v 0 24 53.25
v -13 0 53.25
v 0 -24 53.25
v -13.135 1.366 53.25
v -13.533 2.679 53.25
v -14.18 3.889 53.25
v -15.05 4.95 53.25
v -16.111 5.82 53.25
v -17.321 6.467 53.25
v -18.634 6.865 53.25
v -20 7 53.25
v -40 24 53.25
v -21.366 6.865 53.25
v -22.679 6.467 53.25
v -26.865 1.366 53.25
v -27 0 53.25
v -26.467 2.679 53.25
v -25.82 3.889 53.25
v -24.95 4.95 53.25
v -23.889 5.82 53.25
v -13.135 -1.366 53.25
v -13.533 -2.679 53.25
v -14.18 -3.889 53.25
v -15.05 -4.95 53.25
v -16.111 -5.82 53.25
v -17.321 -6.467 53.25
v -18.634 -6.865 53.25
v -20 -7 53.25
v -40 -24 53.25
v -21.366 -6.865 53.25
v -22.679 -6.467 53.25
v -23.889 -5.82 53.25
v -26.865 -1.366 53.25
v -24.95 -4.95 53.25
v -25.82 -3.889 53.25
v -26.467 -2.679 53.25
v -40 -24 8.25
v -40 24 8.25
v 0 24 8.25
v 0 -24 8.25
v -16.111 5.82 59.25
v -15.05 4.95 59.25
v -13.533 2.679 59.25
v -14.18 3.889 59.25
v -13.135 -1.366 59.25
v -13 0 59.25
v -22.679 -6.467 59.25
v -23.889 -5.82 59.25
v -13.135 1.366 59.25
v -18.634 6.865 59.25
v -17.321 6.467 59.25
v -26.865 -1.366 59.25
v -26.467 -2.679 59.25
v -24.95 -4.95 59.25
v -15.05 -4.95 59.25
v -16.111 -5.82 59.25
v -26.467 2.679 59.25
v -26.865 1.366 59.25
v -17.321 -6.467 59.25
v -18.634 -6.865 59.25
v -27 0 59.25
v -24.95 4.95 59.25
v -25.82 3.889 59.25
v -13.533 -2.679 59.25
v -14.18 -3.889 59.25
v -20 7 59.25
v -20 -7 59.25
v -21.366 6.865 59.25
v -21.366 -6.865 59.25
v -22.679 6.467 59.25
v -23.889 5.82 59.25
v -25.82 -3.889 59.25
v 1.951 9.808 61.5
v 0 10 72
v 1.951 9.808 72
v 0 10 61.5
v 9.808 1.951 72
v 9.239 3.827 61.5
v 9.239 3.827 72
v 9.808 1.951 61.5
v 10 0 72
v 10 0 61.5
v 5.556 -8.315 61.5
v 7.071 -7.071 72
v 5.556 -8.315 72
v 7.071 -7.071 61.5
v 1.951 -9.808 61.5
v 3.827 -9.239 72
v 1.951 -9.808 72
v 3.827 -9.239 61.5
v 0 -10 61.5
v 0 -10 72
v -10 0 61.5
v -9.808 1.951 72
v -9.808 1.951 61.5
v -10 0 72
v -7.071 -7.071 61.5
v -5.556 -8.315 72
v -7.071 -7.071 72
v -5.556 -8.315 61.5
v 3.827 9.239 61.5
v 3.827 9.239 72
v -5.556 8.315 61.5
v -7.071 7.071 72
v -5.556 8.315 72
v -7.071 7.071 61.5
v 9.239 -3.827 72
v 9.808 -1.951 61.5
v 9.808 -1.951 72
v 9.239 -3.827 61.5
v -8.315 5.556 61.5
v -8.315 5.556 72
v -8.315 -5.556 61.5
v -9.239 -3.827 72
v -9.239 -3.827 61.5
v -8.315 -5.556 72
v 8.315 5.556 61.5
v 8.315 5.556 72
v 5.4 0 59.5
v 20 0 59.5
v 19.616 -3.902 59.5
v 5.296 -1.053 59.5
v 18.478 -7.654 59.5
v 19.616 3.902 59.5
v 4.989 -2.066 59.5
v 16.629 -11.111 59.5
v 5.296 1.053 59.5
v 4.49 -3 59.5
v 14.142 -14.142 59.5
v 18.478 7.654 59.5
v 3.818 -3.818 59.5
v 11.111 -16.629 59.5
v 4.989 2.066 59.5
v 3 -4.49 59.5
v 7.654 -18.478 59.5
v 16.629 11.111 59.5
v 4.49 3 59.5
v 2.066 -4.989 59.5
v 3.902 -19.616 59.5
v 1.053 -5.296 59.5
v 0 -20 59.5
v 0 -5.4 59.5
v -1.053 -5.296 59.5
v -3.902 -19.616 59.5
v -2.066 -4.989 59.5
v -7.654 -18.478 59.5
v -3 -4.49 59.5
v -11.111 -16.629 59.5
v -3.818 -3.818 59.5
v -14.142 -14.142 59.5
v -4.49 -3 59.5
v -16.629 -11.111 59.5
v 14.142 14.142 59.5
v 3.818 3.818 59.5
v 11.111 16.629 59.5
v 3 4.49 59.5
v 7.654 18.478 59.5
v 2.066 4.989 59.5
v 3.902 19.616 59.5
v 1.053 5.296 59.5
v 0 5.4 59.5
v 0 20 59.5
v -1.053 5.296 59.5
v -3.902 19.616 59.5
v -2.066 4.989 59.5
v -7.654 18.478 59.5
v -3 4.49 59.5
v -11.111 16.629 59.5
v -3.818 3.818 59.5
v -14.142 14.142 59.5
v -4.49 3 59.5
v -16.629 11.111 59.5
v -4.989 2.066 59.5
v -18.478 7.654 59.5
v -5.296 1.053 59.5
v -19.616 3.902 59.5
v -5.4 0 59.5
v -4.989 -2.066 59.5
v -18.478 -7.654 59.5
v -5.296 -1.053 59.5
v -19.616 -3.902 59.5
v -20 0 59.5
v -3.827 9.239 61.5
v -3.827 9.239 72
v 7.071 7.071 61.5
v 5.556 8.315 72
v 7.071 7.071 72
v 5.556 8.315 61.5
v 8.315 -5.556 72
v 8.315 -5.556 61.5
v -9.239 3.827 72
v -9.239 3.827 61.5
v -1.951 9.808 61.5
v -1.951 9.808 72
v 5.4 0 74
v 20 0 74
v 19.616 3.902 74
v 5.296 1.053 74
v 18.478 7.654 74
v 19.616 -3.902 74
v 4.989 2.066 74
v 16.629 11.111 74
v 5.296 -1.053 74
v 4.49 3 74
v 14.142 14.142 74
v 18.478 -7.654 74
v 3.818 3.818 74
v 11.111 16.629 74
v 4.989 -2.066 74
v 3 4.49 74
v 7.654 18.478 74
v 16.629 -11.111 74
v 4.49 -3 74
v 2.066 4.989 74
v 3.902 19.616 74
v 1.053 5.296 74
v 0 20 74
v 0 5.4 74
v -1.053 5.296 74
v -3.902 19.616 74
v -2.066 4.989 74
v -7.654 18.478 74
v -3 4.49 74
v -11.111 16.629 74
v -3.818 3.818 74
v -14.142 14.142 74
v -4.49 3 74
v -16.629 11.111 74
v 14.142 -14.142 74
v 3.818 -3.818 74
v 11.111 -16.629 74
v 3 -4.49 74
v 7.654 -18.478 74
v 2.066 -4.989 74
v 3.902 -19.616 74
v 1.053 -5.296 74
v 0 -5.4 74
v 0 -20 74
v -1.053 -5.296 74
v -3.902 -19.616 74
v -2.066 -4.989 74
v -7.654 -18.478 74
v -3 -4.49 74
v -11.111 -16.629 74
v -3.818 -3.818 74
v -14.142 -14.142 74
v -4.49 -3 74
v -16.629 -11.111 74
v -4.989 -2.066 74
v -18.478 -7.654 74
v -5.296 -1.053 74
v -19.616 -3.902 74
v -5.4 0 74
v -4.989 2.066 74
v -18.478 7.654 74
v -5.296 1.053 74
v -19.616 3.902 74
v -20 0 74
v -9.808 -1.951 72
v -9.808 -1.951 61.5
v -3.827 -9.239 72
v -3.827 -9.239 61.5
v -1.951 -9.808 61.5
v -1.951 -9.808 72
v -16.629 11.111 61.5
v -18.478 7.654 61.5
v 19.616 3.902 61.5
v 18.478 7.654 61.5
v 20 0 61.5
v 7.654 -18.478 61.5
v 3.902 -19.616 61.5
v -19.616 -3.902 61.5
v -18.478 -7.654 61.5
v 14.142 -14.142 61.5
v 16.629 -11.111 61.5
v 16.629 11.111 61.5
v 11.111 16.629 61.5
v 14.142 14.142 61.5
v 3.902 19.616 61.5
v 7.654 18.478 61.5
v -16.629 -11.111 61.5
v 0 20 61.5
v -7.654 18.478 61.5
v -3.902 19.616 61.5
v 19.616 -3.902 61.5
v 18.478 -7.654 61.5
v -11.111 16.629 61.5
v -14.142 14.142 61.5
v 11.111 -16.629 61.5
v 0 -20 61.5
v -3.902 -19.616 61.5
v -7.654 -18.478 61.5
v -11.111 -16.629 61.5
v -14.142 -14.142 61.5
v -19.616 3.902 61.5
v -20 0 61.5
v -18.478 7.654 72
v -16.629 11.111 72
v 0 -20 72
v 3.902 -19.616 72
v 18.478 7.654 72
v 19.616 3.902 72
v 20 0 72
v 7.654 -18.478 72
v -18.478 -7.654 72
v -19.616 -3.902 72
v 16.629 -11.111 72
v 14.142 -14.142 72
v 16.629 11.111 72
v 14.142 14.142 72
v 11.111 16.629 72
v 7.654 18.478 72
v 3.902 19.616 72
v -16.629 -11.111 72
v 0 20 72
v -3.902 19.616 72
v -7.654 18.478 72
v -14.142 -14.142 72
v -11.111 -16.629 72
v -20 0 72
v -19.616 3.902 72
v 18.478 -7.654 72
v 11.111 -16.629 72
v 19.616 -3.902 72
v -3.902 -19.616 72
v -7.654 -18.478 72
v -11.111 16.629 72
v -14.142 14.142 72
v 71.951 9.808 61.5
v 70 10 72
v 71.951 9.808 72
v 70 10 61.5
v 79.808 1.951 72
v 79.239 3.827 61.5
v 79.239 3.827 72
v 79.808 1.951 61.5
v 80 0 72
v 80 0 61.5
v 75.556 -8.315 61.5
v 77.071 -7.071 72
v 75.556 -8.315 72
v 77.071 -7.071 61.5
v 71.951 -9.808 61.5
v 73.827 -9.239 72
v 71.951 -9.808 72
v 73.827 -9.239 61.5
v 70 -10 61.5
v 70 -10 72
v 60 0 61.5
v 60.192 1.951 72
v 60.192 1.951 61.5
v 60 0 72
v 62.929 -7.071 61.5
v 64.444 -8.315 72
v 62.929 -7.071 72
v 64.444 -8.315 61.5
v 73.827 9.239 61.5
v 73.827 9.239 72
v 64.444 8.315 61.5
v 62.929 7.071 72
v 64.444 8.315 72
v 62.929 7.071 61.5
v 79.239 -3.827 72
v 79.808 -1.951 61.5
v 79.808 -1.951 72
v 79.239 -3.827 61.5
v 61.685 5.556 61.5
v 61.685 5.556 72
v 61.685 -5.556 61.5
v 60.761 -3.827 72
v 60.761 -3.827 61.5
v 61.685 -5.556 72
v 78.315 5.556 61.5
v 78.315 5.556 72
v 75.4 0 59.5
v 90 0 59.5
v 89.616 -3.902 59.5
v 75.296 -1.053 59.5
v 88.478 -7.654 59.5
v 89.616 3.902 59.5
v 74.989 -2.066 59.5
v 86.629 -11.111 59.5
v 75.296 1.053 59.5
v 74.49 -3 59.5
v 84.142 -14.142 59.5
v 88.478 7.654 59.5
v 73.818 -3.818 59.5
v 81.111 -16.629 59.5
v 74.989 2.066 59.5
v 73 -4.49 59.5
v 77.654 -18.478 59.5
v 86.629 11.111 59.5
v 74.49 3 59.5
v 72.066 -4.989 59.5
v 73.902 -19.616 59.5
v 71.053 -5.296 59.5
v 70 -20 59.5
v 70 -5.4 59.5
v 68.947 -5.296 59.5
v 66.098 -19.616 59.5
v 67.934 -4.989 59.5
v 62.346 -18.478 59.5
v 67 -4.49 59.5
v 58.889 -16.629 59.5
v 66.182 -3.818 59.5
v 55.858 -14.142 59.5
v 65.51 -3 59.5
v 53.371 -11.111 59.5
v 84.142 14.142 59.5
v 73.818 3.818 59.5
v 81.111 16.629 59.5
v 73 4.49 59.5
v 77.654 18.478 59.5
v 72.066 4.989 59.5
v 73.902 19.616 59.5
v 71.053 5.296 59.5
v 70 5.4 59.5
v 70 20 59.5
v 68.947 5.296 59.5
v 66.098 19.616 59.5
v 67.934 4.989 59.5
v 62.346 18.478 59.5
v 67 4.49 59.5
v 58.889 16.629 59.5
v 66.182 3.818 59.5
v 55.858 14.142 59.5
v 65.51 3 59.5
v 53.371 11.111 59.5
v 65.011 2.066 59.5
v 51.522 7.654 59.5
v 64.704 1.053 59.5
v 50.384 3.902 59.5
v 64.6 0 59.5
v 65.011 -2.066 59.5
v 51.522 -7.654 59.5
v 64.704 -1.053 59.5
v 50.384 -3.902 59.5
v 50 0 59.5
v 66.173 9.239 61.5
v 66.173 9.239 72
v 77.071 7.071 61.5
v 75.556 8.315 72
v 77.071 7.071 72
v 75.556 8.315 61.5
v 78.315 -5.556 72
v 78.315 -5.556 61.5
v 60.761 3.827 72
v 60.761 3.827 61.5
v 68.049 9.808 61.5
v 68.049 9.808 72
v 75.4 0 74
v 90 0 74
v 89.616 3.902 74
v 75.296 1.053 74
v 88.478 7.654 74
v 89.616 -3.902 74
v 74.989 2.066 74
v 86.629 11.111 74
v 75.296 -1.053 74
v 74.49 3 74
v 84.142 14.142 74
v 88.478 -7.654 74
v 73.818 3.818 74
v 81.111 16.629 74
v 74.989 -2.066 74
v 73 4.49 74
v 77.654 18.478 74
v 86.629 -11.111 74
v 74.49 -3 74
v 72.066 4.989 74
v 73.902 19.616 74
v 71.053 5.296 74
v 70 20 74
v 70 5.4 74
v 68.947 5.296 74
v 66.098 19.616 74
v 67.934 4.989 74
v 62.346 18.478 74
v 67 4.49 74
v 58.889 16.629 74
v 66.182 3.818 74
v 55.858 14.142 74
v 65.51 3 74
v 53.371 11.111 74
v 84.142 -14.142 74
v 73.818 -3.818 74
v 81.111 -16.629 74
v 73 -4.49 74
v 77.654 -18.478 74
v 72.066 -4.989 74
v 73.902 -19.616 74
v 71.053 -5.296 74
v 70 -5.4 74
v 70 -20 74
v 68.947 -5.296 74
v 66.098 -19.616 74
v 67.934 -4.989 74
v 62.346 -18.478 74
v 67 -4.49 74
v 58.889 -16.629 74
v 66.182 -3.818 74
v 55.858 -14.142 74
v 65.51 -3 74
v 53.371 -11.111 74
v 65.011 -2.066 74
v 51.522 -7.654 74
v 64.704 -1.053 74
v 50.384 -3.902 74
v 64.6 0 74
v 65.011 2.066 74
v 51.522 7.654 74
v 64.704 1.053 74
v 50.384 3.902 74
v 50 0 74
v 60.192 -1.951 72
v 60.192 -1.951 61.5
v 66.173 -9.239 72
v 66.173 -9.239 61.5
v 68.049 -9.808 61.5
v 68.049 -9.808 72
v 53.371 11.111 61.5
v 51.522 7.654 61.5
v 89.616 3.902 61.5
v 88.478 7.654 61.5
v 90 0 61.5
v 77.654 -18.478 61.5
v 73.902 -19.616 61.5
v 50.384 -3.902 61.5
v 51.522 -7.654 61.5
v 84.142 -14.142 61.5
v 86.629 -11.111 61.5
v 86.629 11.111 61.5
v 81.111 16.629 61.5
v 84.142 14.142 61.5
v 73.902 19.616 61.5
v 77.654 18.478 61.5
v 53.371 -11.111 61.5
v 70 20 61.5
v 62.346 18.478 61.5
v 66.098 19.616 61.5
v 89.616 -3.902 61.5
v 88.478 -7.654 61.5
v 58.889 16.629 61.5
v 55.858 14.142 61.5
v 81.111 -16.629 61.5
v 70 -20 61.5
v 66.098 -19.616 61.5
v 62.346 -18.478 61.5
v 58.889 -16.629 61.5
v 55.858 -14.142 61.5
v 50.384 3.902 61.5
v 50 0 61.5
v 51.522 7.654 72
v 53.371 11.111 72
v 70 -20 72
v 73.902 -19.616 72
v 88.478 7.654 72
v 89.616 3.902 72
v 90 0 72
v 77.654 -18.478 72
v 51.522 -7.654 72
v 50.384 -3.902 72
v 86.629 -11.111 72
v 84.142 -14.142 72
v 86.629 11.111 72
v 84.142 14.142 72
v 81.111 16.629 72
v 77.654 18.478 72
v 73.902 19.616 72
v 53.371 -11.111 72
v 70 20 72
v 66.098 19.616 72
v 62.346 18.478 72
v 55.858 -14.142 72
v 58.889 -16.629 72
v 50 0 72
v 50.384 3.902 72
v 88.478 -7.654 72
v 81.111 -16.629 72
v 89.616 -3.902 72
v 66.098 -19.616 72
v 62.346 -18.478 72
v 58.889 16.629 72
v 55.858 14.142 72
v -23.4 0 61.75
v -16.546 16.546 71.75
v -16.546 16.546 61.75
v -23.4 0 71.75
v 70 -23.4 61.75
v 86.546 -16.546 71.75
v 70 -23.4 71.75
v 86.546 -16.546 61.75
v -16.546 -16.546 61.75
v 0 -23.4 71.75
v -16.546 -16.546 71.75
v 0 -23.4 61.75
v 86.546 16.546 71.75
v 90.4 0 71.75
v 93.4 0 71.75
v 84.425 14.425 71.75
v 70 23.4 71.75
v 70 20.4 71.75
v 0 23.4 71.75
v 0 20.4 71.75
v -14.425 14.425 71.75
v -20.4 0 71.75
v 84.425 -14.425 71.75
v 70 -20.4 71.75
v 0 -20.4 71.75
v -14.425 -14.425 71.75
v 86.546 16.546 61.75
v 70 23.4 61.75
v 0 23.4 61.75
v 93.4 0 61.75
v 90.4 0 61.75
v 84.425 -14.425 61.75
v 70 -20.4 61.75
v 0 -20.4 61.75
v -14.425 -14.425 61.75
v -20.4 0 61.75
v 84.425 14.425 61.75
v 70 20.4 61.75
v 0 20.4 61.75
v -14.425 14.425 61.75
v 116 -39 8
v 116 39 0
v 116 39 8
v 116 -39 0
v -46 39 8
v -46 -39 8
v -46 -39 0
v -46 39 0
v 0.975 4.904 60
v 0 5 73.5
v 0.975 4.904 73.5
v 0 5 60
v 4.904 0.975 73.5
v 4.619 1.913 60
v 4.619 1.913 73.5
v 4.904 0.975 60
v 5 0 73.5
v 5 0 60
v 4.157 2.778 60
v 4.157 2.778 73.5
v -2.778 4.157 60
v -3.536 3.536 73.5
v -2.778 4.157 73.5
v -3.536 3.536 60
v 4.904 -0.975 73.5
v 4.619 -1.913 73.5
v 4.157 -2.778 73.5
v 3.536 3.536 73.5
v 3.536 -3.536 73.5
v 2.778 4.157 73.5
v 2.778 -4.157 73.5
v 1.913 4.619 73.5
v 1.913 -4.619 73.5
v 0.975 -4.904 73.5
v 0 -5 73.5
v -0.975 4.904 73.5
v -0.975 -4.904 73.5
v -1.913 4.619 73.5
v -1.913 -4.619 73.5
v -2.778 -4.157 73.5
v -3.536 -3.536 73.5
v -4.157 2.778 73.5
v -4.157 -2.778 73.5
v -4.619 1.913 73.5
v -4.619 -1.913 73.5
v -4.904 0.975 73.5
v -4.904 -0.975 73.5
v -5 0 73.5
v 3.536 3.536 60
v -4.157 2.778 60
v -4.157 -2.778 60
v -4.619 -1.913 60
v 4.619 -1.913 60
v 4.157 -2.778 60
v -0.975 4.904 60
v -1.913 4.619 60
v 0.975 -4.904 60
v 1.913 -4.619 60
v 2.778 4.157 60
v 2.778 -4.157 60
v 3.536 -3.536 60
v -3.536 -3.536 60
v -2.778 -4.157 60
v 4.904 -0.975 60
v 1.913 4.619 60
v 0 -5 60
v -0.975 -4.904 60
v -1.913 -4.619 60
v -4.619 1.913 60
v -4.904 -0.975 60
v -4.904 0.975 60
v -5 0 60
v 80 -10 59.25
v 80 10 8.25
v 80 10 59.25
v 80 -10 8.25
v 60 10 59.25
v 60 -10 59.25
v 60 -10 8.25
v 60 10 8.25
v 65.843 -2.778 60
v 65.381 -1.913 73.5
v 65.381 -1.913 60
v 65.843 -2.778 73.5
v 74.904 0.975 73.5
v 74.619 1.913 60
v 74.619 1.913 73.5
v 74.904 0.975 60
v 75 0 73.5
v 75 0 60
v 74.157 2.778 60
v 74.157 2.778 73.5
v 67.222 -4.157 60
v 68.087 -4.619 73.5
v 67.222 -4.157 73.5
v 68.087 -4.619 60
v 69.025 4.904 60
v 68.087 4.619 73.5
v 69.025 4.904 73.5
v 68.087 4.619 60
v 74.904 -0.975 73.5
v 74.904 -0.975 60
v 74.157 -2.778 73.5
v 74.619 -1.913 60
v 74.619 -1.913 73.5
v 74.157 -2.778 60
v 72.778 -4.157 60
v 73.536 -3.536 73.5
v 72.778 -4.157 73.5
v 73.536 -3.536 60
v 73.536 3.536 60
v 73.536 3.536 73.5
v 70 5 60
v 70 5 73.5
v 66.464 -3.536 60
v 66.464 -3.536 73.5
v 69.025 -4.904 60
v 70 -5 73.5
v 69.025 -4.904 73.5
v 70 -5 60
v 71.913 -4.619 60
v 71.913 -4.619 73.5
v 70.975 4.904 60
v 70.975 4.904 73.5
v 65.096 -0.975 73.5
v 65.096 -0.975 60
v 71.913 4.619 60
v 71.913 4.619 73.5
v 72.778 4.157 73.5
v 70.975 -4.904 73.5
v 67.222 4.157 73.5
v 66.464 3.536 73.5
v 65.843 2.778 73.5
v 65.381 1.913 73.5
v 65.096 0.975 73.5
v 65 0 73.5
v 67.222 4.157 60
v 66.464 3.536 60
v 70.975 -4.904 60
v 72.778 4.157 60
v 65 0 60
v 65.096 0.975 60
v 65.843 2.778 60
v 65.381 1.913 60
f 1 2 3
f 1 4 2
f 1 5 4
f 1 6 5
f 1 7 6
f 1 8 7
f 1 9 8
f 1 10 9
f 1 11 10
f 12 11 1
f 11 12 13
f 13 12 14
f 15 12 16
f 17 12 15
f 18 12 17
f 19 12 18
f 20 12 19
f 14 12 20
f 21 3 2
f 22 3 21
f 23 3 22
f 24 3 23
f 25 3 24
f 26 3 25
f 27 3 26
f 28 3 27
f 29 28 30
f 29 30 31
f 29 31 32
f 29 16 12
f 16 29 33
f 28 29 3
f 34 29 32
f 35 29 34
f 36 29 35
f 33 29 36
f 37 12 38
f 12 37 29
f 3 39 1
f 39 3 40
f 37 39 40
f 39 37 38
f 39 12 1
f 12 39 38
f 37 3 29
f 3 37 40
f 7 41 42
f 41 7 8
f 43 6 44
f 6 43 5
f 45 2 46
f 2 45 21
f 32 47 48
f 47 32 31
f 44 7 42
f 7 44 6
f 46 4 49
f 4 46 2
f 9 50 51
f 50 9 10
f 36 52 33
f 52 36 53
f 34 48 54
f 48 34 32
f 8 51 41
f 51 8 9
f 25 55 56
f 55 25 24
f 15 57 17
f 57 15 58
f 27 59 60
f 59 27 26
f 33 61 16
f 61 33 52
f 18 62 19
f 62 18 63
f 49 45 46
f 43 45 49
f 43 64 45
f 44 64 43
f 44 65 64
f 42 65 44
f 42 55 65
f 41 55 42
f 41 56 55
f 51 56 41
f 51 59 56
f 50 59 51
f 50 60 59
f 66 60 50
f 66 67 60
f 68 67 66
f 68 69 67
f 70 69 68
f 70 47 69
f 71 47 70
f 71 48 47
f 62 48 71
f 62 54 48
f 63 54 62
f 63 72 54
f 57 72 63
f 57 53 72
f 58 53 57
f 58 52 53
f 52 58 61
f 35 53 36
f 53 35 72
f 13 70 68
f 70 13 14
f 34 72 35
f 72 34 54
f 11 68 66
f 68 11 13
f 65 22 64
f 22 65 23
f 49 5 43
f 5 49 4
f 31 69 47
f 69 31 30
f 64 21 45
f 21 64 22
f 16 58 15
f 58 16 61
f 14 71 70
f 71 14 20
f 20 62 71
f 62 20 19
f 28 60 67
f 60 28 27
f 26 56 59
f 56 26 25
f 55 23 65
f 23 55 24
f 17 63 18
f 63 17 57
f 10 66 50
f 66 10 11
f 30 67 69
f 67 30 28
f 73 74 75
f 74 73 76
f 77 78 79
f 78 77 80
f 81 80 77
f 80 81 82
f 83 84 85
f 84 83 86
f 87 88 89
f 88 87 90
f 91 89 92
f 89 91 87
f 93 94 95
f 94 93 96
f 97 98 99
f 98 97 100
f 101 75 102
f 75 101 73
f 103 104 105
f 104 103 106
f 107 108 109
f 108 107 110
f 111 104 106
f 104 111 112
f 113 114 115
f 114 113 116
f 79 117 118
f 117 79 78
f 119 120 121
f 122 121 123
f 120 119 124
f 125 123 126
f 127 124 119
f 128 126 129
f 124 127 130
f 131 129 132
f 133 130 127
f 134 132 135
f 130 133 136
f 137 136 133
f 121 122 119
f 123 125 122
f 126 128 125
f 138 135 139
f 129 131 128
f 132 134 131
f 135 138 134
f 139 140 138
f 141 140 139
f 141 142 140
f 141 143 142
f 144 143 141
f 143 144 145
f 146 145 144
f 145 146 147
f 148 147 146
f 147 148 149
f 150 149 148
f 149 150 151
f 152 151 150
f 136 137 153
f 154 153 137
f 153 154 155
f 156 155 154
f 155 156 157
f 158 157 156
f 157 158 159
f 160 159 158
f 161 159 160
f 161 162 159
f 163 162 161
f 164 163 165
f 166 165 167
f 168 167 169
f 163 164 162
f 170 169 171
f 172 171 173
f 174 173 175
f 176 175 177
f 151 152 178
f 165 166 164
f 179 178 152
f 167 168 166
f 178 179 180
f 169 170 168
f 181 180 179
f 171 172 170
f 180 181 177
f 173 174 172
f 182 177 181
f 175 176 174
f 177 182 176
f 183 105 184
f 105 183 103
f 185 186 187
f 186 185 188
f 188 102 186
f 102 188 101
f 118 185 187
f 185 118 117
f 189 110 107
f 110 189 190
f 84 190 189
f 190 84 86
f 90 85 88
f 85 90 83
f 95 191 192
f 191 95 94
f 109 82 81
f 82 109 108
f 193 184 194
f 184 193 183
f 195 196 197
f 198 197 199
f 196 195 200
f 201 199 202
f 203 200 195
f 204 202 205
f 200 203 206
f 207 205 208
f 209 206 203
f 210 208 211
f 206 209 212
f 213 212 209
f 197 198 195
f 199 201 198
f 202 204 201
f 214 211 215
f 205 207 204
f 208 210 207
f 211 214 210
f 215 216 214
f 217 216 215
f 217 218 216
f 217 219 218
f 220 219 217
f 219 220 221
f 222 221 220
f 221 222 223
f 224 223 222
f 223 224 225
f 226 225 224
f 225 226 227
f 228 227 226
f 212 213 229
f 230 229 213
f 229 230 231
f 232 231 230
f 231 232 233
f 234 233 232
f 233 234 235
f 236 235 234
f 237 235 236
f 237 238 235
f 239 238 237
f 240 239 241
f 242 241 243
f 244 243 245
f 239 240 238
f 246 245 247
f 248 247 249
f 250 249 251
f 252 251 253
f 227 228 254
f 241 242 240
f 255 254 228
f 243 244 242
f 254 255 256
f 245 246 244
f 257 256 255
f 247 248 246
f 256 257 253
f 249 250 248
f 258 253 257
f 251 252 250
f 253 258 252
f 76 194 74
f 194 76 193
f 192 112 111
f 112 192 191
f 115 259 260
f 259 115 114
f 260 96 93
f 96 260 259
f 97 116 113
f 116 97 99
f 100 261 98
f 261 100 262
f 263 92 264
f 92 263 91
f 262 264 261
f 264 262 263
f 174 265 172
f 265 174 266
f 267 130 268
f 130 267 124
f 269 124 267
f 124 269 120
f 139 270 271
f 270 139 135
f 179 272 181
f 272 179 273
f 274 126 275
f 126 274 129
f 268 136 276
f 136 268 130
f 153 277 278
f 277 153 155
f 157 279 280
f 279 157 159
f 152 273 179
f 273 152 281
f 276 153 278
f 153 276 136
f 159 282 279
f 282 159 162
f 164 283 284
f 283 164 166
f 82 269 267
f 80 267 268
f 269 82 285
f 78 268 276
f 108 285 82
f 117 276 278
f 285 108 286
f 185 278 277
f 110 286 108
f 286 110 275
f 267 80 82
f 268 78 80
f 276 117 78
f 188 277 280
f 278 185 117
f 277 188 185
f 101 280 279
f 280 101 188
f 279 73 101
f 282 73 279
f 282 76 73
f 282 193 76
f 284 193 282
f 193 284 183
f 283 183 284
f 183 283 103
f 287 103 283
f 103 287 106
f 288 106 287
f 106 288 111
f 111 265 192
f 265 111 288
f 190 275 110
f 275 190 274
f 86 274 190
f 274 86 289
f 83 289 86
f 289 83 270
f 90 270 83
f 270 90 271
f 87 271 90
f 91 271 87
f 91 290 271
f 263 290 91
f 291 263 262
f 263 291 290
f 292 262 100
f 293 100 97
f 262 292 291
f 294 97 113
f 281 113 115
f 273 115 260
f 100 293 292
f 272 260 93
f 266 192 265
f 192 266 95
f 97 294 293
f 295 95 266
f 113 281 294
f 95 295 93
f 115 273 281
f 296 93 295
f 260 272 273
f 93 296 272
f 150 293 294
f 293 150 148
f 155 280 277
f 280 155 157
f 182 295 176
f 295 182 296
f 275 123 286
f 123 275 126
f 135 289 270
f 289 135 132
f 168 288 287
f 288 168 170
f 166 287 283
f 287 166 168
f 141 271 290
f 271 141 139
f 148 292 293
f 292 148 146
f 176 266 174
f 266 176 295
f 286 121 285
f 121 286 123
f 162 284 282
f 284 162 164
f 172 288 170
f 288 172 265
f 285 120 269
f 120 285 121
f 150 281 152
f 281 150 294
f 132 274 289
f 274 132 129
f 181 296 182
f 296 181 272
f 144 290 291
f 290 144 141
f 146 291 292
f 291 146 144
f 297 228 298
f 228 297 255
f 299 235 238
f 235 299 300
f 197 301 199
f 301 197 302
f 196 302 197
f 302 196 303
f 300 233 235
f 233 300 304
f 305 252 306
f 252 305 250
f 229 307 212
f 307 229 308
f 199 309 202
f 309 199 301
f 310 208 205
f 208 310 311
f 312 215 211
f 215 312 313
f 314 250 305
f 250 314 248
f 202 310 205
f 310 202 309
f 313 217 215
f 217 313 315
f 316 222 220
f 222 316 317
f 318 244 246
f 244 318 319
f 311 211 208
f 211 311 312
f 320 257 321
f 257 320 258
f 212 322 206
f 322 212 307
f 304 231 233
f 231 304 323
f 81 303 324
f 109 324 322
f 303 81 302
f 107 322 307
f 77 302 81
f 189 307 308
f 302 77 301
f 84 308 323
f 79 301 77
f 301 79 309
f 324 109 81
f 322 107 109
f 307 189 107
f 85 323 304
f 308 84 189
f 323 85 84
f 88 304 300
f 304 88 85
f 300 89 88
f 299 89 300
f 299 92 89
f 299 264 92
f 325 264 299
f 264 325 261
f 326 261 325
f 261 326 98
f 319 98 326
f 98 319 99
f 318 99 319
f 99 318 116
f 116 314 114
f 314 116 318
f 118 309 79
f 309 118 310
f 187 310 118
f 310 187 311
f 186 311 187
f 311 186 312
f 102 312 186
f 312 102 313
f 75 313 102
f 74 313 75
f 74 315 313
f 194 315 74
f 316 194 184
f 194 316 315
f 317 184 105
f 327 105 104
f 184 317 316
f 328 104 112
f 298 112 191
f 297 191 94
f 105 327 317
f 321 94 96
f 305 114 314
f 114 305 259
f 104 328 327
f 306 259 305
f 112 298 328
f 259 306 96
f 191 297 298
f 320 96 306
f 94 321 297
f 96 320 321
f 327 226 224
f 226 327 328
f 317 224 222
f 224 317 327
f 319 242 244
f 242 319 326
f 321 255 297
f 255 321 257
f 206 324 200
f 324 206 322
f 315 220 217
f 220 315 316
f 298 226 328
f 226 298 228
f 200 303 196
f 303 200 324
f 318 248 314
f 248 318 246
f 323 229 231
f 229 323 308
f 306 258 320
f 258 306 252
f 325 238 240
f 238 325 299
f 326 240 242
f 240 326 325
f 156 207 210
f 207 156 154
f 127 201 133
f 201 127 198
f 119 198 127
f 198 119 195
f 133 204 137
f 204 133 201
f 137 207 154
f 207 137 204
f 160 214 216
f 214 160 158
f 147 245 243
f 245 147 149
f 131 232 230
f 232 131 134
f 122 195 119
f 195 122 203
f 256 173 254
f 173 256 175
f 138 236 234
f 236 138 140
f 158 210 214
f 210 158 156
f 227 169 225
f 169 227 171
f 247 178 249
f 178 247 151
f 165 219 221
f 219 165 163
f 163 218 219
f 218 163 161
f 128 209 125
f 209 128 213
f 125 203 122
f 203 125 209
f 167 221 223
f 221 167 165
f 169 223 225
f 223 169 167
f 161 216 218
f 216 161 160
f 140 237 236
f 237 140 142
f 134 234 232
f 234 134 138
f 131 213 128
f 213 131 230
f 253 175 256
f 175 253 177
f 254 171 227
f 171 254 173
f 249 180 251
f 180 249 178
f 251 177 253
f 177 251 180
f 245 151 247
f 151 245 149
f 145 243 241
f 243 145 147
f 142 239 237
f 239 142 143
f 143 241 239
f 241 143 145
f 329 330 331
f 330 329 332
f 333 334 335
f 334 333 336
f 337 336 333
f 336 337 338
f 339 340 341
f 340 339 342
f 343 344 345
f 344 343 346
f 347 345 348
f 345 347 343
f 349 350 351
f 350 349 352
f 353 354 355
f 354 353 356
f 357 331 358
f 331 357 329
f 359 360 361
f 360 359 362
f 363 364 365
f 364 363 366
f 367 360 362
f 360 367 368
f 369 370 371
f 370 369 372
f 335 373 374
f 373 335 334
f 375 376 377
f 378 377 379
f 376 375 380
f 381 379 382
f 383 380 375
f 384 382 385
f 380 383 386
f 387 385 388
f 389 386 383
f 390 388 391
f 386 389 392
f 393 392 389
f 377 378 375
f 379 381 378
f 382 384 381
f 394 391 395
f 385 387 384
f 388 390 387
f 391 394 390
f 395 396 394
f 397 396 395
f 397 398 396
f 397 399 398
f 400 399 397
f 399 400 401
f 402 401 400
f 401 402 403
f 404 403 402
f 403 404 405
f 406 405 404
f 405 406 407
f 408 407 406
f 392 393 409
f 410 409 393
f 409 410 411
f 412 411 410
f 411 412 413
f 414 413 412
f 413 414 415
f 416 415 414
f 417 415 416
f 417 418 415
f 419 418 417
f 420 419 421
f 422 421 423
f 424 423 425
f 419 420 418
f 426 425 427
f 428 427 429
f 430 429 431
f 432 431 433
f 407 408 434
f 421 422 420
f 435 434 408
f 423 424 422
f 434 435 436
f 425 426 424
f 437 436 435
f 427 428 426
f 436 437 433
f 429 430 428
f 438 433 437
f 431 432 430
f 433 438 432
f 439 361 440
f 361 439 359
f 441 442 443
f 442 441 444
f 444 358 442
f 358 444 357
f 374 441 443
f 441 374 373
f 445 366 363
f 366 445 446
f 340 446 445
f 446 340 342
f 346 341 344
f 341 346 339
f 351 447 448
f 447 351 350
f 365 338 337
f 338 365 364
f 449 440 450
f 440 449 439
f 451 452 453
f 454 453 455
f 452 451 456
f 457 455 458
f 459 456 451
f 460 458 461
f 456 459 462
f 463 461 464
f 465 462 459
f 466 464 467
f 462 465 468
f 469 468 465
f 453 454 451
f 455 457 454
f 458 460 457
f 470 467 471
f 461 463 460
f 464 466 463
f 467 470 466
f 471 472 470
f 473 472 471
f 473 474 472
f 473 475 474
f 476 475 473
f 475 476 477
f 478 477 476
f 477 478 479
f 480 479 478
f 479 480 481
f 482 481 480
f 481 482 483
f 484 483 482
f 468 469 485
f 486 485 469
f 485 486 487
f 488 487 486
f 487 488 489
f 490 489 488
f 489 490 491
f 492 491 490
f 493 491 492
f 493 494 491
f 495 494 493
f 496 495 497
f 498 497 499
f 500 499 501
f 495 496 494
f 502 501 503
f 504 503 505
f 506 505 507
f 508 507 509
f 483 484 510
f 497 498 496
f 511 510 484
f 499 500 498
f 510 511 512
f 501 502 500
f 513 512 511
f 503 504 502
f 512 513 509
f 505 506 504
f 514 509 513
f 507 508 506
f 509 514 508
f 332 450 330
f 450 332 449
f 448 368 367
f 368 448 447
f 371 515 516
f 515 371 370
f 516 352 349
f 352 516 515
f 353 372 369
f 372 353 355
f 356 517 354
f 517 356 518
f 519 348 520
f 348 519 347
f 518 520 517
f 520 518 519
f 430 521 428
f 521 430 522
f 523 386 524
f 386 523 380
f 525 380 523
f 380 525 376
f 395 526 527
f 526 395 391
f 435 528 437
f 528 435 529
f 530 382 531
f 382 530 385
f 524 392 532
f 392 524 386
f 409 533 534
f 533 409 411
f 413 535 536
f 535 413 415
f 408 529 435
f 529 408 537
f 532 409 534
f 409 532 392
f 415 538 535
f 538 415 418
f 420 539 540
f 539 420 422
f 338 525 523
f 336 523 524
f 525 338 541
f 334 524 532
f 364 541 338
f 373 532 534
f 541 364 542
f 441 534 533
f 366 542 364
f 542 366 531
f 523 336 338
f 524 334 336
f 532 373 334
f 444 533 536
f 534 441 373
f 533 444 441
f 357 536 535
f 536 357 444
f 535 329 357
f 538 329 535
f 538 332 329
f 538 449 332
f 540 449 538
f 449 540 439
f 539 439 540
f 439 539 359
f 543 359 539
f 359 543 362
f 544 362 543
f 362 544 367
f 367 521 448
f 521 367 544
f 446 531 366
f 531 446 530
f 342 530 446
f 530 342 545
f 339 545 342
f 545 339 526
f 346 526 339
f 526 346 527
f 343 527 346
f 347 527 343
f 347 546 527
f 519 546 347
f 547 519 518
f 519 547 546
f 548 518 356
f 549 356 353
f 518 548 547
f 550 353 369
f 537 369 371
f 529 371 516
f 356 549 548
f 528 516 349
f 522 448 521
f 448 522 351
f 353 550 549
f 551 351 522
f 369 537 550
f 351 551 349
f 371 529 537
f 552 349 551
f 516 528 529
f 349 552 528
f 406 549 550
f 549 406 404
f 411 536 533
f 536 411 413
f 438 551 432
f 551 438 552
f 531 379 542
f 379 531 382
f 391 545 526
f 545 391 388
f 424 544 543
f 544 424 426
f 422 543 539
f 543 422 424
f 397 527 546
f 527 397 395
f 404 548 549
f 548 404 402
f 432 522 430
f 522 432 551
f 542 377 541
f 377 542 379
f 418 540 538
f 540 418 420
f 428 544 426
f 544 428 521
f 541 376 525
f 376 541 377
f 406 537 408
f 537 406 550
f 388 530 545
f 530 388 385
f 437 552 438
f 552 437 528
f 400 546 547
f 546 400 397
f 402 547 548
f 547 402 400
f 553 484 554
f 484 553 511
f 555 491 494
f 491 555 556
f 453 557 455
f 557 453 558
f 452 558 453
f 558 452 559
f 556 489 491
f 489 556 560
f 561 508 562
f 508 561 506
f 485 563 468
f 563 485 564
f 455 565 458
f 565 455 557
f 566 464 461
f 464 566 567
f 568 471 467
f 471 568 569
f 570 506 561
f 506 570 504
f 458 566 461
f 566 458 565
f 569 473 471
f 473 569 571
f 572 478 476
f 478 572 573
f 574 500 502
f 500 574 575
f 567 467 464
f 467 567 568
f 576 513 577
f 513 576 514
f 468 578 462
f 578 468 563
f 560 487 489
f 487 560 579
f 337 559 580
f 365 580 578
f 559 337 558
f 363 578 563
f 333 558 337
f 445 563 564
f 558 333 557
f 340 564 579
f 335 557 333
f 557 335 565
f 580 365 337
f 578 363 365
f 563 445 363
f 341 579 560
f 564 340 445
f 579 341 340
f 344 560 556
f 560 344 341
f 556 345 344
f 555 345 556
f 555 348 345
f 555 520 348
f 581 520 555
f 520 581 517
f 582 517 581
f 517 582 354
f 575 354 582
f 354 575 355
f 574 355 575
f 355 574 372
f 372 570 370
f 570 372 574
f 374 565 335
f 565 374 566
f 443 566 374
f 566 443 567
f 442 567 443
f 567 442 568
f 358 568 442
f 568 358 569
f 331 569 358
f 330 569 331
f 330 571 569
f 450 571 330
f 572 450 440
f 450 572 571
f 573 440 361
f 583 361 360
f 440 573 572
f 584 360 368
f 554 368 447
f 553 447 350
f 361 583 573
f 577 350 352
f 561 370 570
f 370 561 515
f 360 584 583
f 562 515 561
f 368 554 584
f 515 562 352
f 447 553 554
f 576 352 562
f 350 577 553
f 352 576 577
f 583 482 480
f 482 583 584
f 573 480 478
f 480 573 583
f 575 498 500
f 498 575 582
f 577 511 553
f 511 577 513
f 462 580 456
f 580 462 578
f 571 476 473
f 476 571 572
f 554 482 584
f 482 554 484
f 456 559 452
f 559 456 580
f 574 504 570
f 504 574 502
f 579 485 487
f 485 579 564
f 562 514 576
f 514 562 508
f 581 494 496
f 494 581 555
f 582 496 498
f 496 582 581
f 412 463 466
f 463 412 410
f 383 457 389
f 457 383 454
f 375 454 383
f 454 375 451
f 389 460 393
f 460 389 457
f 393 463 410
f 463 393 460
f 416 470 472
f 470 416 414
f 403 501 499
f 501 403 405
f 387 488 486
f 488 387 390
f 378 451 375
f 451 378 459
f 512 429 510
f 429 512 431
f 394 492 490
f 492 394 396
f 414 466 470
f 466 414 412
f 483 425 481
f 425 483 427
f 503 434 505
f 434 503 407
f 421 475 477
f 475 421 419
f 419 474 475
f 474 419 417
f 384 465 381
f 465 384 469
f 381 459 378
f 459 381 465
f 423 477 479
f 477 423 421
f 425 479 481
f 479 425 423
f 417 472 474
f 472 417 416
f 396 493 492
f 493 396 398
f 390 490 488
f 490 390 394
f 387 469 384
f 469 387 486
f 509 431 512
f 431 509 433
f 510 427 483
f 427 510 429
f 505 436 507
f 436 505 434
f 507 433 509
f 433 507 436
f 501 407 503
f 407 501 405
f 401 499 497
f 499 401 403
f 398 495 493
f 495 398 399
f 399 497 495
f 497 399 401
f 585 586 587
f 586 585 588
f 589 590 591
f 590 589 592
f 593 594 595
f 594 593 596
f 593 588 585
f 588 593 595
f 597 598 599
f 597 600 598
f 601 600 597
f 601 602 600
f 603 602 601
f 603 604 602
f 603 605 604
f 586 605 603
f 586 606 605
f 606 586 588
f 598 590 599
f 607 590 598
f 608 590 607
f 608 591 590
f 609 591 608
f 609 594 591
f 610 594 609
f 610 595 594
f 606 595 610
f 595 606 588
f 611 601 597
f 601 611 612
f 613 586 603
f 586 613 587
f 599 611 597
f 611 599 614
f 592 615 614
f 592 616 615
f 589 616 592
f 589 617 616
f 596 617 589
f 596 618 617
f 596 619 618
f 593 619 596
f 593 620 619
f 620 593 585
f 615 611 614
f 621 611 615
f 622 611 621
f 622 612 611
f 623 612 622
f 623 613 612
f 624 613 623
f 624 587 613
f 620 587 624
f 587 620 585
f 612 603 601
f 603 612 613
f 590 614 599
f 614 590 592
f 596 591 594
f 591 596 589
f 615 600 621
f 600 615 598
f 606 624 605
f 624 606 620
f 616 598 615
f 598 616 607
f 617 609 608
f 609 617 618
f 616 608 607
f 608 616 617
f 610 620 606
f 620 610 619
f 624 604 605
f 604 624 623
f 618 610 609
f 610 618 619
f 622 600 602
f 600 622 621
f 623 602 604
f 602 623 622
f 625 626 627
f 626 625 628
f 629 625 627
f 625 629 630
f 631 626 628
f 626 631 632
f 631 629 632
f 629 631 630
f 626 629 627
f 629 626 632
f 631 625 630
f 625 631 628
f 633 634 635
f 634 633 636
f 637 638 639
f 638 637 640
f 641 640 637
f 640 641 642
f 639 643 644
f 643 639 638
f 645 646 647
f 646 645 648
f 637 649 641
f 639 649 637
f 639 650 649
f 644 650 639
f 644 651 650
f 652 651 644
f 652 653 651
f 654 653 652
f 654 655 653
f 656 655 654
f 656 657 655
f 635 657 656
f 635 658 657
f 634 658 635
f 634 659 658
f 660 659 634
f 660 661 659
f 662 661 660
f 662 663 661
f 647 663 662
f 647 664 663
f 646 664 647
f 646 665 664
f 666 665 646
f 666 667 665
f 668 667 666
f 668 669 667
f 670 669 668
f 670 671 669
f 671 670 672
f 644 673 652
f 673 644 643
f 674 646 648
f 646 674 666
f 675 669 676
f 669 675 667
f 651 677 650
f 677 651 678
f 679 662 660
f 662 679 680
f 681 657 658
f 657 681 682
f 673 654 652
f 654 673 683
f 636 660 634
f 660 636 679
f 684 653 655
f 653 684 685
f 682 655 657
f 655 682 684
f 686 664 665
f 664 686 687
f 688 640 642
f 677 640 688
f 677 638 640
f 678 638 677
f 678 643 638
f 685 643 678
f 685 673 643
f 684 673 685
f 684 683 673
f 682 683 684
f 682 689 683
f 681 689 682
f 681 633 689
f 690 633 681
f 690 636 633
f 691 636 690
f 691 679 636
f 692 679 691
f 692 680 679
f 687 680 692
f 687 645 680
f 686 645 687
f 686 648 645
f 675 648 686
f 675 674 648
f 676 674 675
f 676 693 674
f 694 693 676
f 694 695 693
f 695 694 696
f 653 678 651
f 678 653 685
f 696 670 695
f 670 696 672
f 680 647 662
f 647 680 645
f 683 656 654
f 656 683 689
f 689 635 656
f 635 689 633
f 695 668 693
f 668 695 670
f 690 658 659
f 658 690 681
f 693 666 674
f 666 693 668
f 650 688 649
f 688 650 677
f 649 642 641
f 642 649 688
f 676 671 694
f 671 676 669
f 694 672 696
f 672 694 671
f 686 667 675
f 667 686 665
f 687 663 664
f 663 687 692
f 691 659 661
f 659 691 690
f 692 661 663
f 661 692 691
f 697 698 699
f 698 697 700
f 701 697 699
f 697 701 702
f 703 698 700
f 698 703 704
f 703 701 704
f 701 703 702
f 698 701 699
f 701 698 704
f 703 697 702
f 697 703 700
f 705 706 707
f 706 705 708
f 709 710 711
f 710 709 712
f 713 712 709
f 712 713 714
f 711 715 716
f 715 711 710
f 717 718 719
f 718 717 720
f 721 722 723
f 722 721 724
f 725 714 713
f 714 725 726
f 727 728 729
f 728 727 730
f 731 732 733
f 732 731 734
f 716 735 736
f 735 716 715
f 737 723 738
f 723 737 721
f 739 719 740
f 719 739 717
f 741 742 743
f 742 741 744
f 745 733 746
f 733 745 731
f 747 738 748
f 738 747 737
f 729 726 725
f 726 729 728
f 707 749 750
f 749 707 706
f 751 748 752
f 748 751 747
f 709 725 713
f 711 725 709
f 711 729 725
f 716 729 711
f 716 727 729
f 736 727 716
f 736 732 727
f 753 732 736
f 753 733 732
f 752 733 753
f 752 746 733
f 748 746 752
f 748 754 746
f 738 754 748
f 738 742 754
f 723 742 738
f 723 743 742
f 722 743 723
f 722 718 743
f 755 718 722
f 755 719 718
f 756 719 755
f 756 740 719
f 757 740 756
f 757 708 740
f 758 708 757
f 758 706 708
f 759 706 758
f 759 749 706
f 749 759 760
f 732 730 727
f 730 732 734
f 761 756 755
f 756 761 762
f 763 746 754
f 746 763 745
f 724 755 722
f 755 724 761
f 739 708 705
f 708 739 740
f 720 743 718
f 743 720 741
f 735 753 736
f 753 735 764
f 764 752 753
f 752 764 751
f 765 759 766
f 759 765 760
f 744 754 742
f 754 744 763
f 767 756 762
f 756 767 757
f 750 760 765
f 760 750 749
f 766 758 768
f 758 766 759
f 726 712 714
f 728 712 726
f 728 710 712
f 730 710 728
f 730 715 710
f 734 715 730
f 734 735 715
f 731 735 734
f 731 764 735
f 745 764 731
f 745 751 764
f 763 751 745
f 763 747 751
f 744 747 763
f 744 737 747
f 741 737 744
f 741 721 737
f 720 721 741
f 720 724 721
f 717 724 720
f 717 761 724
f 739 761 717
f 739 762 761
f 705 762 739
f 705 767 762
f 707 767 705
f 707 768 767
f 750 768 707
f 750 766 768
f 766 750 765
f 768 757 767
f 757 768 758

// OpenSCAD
$fn = 32;

// ------------------------------------------------------------------------
// Motor belt drive: span 70 mm, pulleys d40, belt 10 mm wide
// Every part is its own module, assembly() places every instance.
// ------------------------------------------------------------------------

// --- part 1 ---
module base_plate() {
  difference() {
    translate([-81, -39, 0]) cube([162, 78, 8]);
  }
}

// --- part 2 ---
module motor() {
  union() {
    translate([-22.5, -24, 0]) cube([45, 48, 40]);
    translate([25.5, 0, 20]) rotate([0, 90, 0]) cylinder(h = 6, d = 14, center = true);
  }
}

// --- part 3 ---
module drive_shaft() {
  translate([0, 0, -6.75]) cylinder(h = 13.5, d = 10);
}

// --- part 4 ---
module pulley_drive() {
  difference() {
    union() {
      cylinder(h = 14.5, d = 20);
      cylinder(h = 2, d = 40);
      translate([0, 0, 12.5]) cylinder(h = 2, d = 40);
    }
    translate([0, 0, -1]) cylinder(h = 16.5, d = 10.8);
  }
}

// --- part 5 ---
module idler_post() {
  translate([-10, -10, 0]) cube([20, 20, 51]);
}

// --- part 6 ---
module driven_shaft() {
  translate([0, 0, -6.75]) cylinder(h = 13.5, d = 10);
}

// --- part 7 ---
module pulley_driven() {
  difference() {
    union() {
      cylinder(h = 14.5, d = 20);
      cylinder(h = 2, d = 40);
      translate([0, 0, 12.5]) cylinder(h = 2, d = 40);
    }
    translate([0, 0, -1]) cylinder(h = 16.5, d = 10.8);
  }
}

// --- part 8 ---
module drive_belt() {
  difference() {
    linear_extrude(height = 10) polygon(points = concat([for (a = [90 : 45 : 270]) [23.4 * cos(a), 23.4 * sin(a)]], [for (a = [270 : 45 : 450]) [70 + 23.4 * cos(a), 23.4 * sin(a)]]));
    translate([0, 0, -1]) linear_extrude(height = 12) polygon(points = concat([for (a = [90 : 45 : 270]) [20.4 * cos(a), 20.4 * sin(a)]], [for (a = [270 : 45 : 450]) [70 + 20.4 * cos(a), 20.4 * sin(a)]]));
  }
}

// --- assembly ---
module assembly() {
  color([0.80, 0.24, 0.20]) translate([35, 0, 0]) rotate([0, 0, 0]) base_plate();
  color([0.20, 0.45, 0.75]) translate([0, 0, 30.75]) rotate([0, 270, 0]) motor();
  color([0.25, 0.62, 0.32]) translate([0, 0, 66.75]) rotate([0, 0, 0]) drive_shaft();
  color([0.92, 0.70, 0.18]) translate([0, 0, 59.5]) rotate([0, 0, 0]) pulley_drive();
  color([0.58, 0.35, 0.70]) translate([70, 0, 8.25]) rotate([0, 0, 0]) idler_post();
  color([0.16, 0.66, 0.66]) translate([70, 0, 66.75]) rotate([0, 0, 0]) driven_shaft();
  color([0.85, 0.48, 0.18]) translate([70, 0, 59.5]) rotate([0, 0, 0]) pulley_driven();
  color([0.55, 0.60, 0.65]) translate([0, 0, 61.75]) rotate([0, 0, 0]) drive_belt();
}

assembly();
